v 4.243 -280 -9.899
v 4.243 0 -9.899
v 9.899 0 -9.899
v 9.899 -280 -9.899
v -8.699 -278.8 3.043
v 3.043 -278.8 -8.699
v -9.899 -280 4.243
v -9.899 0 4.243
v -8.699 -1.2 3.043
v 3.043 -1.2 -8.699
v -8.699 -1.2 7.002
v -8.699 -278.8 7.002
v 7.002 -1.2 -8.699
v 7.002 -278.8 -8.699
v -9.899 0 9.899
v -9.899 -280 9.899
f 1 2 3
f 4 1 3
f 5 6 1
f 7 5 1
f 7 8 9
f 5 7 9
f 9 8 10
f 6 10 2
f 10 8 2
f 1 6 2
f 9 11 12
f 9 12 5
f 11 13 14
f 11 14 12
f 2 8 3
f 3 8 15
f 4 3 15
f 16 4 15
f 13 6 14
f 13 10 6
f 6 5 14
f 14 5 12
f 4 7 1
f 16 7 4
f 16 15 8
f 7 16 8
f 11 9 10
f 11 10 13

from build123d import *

# Parameters (mm, degrees)
F1_DEPTH = 280
F3_DEPTH = 287
F4_T     = -1.2


with BuildPart() as f1:
    # F0 (on Front) → F1 (new body)
    with BuildSketch(Plane.XZ):
        Polygon((-9.899495, 9.899495), (-9.899495, -9.899495), (9.899495, -9.899495), align=None)
    extrude(amount=F1_DEPTH)

    # F2 (on face) → F3 (cut)
    with BuildSketch(Plane(origin=(0, 0, 0), x_dir=(-1, 0, 0), z_dir=(0, 1, 0))):
        Polygon((9.899495, 4.242641), (-4.242641, -9.899495), (9.899495, -9.899495), align=None)
    extrude(amount=-F3_DEPTH, mode=Mode.SUBTRACT)

    # F4
    f4_openings = [f1.faces().sort_by_distance(p)[0] for p in [
        (-2.828427, -140, -2.828427),
    ]]
    offset(amount=F4_T, openings=f4_openings)


solid = f1.part
